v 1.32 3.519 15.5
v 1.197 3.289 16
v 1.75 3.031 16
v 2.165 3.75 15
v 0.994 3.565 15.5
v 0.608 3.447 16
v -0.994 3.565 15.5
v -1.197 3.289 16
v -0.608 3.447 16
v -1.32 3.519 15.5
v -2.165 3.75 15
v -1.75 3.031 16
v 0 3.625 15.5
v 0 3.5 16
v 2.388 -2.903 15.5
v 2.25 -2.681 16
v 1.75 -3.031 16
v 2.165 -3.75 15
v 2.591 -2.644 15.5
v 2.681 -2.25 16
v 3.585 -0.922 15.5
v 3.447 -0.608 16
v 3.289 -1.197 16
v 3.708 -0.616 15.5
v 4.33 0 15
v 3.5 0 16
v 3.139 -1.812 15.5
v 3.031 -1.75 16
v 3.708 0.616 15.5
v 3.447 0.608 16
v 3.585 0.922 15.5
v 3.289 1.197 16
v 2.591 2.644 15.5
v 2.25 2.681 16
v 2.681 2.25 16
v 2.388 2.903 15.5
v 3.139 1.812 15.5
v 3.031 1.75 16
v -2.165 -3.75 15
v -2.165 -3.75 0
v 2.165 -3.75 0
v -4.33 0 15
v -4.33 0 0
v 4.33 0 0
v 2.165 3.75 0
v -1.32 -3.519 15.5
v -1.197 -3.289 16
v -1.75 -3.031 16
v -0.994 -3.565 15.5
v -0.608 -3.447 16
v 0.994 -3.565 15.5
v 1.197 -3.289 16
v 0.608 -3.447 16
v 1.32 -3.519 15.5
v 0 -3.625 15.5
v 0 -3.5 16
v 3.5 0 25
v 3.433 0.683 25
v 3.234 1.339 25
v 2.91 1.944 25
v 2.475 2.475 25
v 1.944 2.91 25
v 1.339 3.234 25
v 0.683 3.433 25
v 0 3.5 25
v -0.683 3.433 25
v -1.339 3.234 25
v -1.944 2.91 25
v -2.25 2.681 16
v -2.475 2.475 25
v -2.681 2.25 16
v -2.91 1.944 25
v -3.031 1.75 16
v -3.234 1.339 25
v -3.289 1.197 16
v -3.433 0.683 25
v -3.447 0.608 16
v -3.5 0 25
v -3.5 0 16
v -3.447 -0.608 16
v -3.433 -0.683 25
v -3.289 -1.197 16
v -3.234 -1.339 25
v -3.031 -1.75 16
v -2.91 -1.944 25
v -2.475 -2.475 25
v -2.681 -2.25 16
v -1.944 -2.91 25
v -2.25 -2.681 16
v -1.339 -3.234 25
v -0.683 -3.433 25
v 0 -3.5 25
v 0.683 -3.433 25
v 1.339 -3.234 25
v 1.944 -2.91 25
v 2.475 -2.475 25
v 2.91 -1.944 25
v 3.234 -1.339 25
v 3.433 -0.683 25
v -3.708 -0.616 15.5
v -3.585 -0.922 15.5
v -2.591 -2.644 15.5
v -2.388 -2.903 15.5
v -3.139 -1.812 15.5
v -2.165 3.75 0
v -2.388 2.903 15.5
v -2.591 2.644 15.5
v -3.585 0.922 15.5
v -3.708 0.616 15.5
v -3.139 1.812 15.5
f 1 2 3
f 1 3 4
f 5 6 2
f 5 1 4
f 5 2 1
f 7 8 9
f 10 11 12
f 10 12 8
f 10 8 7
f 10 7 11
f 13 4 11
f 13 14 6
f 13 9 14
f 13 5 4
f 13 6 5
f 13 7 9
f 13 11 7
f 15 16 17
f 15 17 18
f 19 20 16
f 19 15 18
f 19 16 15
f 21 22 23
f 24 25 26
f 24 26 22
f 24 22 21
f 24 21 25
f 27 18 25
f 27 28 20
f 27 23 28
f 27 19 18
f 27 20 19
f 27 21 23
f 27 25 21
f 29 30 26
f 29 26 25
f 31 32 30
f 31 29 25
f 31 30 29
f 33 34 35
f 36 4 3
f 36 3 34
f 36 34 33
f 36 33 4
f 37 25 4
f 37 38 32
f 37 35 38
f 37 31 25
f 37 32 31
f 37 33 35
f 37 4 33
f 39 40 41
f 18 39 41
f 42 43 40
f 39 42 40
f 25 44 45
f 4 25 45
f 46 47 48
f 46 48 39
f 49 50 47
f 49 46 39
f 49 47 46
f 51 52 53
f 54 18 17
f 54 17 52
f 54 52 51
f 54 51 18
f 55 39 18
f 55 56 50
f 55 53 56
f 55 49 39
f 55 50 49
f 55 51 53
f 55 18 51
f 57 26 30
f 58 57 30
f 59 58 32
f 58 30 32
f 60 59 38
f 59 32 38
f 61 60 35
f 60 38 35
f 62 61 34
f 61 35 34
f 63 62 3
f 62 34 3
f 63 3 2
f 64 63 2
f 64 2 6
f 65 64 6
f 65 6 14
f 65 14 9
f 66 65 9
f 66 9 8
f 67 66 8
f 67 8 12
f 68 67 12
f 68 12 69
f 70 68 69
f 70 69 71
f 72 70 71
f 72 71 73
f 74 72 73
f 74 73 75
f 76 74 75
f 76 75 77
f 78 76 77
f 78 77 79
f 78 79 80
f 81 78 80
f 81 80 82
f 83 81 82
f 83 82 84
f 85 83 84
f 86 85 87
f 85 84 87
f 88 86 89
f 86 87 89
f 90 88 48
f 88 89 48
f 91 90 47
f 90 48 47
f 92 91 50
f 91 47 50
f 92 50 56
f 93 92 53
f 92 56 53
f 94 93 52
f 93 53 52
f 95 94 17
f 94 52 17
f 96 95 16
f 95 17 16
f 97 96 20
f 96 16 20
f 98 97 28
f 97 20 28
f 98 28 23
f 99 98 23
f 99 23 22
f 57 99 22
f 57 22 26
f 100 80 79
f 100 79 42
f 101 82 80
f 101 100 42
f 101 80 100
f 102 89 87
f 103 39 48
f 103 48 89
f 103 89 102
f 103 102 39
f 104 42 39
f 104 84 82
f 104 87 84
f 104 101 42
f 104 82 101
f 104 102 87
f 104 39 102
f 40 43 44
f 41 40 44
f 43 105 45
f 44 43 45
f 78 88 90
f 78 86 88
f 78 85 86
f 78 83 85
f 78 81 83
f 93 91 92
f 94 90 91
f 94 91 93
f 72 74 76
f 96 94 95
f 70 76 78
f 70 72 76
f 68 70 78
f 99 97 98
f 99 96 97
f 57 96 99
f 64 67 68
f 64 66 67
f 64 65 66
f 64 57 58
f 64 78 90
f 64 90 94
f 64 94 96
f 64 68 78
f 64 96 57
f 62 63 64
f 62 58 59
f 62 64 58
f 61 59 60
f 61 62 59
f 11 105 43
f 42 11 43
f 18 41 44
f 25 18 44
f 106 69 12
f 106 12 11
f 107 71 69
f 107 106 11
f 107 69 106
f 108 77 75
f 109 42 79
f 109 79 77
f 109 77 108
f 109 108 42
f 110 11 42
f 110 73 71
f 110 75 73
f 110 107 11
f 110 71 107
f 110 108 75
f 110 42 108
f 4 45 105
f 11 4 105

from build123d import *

# Parameters (mm, degrees)
F1_DEPTH = 15
F3_R     = 3.5
F5_DEPTH = 9


with BuildPart() as f1:
    # F0 (on Top) → F1 (new body)
    with BuildSketch(Plane.XY):
        Polygon((2.1650635095, 3.75), (-2.1650635095, 3.75), (-4.3301270189, 0), (-2.1650635095, -3.75), (2.1650635095, -3.75), (4.3301270189, 0), align=None)
    extrude(amount=F1_DEPTH)

    # F1_face (on face) → F4 section 0
    with BuildSketch(Plane.XY.offset(15)):
        Polygon((4.3301270189, 0), (2.1650635095, 3.75), (-2.1650635095, 3.75), (-4.3301270189, 0), (-2.1650635095, -3.75), (2.1650635095, -3.75), align=None)
    # F3 (on offset) → F4 section 1
    with BuildSketch(Plane.XY.offset(16)):
        Circle(F3_R)
    loft()

    # F5 (add): a face of the model
    f5_faces = [f1.faces().sort_by_distance(p)[0] for p in [
        (0, 0, 16),
    ]]
    extrude(f5_faces, amount=F5_DEPTH)


solid = f1.part
